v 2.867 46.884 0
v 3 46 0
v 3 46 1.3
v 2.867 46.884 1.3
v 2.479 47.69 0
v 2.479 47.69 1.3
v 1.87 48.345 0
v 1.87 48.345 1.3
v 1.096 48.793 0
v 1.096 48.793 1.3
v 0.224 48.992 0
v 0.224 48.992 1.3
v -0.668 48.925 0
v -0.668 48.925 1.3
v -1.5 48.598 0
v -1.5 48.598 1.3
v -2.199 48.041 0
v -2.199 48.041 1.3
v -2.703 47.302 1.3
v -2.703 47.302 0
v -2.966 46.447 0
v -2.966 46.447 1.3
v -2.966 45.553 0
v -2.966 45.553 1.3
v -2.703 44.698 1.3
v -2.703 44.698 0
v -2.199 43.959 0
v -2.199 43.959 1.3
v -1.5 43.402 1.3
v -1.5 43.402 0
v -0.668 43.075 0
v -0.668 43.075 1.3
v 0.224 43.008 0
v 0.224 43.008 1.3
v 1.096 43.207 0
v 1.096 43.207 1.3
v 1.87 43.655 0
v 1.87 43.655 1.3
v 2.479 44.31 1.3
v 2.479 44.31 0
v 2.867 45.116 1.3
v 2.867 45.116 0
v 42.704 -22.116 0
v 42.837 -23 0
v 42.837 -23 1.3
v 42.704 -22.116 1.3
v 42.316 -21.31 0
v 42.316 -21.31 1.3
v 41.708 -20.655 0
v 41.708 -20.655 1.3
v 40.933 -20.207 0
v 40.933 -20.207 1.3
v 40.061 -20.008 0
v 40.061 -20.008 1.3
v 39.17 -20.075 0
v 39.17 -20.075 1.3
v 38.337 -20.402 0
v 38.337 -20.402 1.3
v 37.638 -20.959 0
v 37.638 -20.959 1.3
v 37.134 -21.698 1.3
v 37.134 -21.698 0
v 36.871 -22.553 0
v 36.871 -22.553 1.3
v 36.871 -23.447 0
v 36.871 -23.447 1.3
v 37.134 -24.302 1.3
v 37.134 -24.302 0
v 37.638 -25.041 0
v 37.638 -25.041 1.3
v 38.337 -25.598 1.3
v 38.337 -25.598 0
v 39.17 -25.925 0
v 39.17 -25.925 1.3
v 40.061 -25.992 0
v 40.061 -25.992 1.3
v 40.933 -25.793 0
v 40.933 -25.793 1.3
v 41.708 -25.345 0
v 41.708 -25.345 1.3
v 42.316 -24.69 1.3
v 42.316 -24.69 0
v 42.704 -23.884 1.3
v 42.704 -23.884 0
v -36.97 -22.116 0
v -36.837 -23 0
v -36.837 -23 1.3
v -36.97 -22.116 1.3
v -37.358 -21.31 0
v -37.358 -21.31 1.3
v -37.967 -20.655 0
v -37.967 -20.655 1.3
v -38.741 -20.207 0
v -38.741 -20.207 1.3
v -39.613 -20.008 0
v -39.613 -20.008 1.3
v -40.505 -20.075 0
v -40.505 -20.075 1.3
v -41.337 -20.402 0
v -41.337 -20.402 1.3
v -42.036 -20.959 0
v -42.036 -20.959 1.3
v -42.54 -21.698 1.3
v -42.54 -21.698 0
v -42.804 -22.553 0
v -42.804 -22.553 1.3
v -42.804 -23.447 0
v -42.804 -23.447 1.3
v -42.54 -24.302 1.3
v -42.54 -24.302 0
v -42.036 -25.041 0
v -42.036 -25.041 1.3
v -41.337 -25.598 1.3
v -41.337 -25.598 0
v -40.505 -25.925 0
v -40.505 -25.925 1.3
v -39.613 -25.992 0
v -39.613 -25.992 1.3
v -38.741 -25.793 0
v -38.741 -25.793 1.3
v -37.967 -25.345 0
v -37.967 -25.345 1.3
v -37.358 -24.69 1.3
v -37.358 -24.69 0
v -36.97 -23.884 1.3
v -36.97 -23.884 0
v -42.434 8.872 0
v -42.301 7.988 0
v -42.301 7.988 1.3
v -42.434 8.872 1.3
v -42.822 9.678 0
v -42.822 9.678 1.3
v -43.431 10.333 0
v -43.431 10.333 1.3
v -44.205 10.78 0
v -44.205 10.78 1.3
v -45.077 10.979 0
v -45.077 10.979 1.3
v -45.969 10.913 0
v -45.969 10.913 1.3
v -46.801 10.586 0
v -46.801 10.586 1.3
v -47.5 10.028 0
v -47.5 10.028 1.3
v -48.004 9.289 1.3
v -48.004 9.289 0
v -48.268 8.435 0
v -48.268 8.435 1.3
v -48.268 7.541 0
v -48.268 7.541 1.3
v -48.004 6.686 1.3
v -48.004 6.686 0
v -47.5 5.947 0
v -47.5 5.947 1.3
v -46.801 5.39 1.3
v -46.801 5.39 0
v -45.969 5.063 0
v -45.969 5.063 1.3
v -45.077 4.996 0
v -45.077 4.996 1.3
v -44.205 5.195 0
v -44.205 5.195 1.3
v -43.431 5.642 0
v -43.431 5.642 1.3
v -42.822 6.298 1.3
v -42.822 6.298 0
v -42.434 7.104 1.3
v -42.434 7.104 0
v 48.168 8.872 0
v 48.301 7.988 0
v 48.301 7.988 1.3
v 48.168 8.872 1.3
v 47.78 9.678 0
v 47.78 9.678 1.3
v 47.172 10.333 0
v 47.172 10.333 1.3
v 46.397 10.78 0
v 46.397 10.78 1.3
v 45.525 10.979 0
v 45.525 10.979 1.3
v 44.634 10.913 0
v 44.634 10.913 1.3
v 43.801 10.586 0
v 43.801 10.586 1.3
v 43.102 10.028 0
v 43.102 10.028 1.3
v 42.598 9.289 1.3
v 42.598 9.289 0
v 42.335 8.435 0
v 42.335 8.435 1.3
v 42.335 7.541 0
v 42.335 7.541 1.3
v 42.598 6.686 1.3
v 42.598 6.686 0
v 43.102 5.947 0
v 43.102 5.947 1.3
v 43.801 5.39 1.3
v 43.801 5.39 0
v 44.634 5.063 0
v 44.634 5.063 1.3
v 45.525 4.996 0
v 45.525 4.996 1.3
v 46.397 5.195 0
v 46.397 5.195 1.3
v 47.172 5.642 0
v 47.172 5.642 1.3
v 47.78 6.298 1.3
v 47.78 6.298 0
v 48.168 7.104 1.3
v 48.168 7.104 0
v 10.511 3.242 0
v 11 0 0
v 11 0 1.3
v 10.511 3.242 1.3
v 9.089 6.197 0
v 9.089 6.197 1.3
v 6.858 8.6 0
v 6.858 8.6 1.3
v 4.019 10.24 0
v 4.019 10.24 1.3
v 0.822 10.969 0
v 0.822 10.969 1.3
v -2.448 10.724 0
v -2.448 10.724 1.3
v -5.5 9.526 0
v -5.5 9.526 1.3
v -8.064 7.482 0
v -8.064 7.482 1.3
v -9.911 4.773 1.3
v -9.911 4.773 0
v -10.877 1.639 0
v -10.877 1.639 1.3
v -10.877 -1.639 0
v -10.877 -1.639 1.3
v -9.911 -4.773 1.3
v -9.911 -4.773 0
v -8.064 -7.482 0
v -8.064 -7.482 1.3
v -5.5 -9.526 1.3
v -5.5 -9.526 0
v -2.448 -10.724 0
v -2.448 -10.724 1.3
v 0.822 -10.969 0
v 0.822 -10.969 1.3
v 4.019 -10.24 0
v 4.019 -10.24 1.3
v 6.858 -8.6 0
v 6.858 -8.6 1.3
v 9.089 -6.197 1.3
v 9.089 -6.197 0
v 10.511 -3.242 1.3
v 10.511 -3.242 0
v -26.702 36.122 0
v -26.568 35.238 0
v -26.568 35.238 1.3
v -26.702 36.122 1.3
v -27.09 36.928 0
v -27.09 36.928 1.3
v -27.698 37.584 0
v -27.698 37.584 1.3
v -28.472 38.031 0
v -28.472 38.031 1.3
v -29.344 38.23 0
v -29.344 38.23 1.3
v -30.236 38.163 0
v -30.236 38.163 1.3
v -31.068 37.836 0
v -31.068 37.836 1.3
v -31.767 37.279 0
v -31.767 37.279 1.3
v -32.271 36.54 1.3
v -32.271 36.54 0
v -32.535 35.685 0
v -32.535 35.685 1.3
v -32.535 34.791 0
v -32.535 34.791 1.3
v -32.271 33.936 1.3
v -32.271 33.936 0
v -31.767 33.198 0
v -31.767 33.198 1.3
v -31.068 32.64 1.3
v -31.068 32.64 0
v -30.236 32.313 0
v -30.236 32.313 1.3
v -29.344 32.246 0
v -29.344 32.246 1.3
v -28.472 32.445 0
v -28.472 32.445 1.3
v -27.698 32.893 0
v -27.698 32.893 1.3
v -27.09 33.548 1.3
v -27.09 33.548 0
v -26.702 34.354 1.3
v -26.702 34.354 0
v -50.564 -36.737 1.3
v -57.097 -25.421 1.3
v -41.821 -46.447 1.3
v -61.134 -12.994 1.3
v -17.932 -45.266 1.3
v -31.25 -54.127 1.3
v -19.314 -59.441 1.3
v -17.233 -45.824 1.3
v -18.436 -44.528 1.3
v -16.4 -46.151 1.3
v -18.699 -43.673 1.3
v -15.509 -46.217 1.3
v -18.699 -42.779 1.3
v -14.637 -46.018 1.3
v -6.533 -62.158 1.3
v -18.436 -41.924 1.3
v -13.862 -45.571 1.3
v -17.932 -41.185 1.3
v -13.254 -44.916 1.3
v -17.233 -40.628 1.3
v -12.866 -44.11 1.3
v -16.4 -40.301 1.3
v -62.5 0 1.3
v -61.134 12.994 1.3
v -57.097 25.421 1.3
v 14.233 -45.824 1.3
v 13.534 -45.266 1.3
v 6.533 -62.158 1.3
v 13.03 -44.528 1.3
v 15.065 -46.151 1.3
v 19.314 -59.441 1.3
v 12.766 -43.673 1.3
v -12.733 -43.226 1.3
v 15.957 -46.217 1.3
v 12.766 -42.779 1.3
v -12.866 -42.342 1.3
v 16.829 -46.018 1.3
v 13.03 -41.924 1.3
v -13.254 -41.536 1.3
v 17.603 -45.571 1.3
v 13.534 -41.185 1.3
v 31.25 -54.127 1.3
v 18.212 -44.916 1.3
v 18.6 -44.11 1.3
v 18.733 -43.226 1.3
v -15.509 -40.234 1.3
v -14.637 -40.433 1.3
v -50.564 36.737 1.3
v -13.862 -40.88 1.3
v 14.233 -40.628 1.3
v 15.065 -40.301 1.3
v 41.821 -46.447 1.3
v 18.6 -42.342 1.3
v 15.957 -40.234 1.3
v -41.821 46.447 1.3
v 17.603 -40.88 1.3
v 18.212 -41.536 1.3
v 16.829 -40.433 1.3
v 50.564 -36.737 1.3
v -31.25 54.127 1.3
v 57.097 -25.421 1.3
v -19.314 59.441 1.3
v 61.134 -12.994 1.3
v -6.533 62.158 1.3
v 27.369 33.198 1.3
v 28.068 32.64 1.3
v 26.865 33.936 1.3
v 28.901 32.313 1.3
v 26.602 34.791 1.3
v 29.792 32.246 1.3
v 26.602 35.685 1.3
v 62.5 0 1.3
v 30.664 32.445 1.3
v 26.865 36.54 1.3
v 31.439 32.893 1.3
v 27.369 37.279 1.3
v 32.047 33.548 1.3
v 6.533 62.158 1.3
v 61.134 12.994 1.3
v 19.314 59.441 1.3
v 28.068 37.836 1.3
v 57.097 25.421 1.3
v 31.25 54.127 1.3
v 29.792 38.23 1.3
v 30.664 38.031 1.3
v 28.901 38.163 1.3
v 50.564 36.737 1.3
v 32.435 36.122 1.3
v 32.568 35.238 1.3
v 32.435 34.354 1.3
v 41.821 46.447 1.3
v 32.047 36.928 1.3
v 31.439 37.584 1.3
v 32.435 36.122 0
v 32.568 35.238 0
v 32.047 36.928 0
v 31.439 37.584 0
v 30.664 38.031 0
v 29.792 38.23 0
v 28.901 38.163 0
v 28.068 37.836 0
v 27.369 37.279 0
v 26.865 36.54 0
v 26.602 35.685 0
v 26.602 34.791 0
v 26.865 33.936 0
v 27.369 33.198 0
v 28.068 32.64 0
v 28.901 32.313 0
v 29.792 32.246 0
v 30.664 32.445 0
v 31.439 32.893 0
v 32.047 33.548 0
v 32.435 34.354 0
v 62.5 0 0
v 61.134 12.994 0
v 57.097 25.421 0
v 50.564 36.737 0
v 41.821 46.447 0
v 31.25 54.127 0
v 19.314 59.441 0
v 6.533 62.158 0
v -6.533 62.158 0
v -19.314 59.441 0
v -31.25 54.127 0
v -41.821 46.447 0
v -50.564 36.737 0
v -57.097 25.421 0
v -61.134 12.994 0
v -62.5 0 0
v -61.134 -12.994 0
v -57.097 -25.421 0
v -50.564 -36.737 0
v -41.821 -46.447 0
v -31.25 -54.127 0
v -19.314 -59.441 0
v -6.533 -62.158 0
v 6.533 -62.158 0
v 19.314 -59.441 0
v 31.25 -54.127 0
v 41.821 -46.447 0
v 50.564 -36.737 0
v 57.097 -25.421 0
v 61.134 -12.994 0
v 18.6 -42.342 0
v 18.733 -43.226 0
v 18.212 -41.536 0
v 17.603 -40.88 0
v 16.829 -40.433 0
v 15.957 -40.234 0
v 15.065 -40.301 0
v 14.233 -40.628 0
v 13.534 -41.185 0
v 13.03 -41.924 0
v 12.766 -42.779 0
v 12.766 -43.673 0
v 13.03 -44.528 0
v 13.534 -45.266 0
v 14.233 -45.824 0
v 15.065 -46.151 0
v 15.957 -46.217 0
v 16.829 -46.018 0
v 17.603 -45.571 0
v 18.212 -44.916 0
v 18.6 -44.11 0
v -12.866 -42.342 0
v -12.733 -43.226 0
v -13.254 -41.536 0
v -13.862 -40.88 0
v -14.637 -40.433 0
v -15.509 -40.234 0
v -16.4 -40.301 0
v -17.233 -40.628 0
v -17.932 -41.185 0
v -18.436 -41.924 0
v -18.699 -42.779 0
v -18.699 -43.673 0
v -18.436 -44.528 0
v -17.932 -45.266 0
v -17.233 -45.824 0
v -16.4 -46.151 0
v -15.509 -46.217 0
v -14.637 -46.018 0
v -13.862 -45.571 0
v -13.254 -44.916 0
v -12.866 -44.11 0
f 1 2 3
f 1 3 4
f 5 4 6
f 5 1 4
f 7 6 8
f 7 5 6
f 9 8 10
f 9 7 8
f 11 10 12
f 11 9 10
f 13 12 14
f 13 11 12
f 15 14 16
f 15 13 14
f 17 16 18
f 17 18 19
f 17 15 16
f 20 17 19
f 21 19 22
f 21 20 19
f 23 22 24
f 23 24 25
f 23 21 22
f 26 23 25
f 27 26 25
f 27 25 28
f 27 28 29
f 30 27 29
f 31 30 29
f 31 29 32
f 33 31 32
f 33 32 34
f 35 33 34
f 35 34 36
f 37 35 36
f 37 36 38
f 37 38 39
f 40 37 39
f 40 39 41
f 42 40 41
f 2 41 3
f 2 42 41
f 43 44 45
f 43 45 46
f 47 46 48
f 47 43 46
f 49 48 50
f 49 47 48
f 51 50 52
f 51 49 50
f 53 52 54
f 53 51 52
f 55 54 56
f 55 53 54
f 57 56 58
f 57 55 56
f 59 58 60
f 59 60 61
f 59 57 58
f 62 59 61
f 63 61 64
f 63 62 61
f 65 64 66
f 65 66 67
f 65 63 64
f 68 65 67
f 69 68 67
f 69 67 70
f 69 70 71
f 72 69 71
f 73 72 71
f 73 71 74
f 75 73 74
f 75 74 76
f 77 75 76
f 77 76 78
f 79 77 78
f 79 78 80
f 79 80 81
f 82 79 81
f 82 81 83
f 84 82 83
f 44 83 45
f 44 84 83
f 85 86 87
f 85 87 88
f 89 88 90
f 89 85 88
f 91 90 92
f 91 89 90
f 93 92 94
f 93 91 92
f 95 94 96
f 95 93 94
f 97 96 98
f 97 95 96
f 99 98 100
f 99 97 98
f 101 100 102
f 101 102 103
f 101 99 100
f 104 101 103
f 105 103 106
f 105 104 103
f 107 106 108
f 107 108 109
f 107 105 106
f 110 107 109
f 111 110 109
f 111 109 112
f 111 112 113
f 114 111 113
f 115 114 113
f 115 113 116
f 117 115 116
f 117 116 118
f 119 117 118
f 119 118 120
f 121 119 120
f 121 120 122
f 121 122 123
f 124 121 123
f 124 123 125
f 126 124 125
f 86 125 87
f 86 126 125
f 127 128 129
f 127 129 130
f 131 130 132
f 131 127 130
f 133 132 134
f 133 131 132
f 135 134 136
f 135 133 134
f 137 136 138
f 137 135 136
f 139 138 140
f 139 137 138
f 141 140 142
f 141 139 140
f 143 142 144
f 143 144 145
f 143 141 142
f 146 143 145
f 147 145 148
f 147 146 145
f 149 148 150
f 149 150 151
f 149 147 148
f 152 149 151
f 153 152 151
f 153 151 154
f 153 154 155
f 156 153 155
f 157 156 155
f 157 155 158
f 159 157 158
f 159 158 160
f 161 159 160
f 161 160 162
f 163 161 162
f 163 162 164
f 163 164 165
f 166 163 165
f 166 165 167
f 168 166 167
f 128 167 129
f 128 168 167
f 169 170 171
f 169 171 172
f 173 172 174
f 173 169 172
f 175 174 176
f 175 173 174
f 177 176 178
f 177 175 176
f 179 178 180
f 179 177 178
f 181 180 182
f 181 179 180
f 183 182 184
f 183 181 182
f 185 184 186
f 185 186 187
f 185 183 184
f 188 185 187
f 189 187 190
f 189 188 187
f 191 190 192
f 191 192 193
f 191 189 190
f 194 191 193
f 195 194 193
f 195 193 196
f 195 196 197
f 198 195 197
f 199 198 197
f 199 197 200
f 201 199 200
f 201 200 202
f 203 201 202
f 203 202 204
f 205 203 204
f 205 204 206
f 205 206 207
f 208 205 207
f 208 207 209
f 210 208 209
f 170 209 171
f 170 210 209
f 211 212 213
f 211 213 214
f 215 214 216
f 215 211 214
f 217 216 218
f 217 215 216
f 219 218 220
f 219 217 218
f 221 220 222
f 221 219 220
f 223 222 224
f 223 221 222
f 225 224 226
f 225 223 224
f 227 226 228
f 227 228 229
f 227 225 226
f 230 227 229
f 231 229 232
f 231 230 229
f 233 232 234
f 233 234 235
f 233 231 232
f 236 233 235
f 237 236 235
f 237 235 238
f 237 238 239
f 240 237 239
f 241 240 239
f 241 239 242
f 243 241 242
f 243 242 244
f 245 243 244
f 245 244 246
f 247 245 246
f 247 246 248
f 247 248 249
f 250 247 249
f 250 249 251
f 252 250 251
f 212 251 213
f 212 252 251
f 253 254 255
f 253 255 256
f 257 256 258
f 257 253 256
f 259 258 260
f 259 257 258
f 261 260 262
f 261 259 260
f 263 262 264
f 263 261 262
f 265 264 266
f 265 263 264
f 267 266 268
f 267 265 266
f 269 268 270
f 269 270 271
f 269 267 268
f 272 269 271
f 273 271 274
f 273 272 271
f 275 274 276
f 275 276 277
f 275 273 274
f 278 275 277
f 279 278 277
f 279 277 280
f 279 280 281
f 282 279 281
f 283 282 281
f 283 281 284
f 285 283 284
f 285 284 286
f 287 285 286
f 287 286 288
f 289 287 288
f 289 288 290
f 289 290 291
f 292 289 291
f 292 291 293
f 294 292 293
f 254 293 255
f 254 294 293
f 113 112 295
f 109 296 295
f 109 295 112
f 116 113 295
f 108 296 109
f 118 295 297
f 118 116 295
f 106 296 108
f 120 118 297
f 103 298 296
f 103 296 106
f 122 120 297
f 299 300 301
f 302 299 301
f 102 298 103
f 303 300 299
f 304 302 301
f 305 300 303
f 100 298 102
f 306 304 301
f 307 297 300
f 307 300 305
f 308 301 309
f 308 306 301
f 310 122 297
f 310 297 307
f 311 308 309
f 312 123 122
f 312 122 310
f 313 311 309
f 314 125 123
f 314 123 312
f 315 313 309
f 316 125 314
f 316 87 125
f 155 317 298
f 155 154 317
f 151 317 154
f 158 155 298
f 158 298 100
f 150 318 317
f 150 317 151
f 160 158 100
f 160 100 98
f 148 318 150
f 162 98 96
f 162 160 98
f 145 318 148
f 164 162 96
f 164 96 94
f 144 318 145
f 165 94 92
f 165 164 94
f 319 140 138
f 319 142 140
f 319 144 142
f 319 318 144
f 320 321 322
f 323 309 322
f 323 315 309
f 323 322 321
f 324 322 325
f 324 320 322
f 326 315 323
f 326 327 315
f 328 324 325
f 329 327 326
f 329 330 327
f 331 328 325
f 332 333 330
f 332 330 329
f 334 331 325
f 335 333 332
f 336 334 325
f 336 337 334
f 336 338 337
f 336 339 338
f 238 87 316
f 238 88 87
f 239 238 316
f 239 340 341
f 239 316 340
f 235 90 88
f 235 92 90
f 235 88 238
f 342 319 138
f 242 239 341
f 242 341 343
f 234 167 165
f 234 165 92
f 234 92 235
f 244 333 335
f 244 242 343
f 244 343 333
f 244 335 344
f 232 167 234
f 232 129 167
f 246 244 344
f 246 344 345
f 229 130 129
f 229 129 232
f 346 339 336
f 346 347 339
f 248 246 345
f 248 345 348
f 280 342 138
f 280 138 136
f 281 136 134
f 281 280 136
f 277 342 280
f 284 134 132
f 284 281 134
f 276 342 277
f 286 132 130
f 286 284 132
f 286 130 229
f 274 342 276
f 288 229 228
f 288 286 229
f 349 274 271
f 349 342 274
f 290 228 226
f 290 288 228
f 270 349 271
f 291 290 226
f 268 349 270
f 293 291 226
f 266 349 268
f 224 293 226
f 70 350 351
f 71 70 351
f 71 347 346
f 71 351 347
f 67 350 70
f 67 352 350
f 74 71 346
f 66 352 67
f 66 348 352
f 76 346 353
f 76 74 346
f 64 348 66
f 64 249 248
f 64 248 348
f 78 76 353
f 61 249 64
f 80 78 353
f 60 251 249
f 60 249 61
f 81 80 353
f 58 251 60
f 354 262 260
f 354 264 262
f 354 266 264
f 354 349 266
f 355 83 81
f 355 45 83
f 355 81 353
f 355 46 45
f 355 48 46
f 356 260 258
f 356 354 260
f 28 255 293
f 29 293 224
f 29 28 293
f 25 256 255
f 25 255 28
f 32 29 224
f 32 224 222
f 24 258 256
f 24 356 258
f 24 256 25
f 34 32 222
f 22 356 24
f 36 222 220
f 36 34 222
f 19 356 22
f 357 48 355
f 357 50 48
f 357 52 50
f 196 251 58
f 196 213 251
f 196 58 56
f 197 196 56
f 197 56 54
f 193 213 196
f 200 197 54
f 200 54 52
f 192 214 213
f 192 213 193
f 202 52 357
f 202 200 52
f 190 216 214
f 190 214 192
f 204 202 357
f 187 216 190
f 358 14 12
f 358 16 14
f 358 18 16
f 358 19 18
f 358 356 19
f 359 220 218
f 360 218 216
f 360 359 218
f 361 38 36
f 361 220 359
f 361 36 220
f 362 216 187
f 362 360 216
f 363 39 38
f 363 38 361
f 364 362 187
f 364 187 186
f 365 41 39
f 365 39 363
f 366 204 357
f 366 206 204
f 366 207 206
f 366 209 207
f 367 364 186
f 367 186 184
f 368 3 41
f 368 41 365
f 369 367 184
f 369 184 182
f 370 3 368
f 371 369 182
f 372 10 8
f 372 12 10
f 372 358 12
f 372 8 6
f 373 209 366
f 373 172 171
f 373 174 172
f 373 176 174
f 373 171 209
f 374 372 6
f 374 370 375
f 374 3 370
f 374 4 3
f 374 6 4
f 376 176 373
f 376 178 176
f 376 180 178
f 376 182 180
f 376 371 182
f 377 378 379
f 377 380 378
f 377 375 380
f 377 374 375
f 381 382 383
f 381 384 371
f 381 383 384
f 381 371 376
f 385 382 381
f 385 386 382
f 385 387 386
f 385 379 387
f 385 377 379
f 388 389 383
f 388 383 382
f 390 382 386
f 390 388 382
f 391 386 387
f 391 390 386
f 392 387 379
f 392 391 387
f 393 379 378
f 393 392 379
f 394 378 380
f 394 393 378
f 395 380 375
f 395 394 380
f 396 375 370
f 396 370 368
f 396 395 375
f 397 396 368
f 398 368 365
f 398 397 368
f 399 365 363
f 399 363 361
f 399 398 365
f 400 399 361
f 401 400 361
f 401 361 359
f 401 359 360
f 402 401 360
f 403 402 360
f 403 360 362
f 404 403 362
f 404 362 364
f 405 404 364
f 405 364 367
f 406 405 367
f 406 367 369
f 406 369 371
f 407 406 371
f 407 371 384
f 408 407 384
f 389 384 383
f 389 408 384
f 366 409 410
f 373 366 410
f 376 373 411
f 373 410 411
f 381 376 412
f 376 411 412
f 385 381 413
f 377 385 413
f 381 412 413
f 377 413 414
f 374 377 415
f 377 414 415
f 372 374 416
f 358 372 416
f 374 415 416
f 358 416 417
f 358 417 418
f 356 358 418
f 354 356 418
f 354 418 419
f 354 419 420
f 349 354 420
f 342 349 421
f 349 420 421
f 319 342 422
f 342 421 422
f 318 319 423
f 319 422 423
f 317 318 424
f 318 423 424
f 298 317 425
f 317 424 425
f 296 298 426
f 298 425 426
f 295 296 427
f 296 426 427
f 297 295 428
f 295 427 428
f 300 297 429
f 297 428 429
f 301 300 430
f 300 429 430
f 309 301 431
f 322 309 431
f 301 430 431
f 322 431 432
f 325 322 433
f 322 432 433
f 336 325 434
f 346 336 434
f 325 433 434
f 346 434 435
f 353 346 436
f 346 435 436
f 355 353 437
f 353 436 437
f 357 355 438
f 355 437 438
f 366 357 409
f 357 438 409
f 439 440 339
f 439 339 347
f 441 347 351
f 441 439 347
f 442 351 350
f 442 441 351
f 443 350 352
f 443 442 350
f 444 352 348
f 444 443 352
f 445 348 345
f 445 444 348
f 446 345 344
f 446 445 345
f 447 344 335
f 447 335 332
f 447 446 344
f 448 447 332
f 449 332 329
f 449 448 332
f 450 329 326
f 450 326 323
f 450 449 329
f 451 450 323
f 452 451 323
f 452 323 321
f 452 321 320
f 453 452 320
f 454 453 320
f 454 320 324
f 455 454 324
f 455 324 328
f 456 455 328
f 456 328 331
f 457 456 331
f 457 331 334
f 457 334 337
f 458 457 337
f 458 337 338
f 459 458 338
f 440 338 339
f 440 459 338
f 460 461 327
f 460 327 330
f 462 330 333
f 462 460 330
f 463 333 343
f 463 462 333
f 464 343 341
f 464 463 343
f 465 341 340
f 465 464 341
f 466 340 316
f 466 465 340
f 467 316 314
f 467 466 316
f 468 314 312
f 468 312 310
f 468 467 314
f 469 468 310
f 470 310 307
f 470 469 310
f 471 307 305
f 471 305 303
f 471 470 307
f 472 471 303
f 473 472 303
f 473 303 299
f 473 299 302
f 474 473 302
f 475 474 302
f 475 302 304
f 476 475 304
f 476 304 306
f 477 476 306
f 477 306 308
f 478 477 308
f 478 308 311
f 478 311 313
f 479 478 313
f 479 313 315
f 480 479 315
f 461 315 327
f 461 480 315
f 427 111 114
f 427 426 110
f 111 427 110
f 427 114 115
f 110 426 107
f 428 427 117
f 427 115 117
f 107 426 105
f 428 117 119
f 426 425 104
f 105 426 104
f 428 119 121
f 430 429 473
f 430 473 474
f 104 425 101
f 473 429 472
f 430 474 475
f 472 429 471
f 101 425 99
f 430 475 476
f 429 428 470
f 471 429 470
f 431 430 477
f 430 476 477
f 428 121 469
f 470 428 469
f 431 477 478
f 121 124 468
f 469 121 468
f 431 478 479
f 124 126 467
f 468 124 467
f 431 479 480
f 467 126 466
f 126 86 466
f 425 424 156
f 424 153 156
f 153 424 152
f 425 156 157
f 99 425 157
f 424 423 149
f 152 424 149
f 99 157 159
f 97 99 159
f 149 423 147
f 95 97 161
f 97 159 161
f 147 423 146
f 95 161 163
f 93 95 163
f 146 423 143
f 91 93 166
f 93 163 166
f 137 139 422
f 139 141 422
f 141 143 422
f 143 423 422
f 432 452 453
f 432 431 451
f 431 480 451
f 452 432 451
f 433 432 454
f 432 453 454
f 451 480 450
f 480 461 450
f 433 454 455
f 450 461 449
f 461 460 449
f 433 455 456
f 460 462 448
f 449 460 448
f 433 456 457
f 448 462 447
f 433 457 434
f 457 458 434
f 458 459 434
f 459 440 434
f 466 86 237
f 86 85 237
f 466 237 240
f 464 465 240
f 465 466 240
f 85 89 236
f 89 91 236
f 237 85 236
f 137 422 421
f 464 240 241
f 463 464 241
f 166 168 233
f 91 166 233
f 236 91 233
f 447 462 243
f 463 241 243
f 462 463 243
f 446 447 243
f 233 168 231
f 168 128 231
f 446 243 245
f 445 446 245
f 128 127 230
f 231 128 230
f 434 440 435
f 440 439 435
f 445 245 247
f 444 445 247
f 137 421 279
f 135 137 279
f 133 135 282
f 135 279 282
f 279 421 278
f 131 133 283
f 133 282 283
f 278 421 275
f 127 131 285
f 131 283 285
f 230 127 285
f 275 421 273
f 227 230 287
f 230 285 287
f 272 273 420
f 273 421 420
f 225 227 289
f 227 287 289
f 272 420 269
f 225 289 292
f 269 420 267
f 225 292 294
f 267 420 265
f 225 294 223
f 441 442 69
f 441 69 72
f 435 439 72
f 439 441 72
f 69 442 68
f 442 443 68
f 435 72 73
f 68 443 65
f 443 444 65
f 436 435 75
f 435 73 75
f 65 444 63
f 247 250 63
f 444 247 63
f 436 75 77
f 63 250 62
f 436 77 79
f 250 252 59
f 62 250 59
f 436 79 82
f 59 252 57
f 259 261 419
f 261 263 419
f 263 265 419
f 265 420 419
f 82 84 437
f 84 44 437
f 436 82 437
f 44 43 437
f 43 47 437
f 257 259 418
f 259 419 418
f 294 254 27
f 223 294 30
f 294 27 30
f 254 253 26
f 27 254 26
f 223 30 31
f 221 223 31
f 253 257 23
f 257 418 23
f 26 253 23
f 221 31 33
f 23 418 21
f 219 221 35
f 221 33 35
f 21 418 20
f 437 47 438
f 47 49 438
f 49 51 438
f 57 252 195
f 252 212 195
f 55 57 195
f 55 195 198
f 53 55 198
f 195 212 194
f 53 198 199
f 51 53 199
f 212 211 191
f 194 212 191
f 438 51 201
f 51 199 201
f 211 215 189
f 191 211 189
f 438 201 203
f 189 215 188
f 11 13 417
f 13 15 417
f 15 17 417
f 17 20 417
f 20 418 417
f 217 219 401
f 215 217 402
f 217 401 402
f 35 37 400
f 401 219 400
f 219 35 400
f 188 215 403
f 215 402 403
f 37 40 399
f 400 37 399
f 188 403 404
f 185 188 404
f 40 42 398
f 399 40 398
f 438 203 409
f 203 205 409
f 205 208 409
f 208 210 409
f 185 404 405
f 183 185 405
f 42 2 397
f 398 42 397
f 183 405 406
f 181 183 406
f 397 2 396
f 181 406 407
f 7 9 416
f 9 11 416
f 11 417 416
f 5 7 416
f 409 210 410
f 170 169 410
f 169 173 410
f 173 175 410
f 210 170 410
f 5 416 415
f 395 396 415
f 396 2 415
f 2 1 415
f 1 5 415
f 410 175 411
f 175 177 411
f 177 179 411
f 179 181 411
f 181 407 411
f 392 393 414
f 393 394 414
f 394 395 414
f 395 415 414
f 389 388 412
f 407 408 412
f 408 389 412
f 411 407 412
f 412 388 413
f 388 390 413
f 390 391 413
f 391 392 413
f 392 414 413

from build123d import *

# Parameters (mm, degrees)
SKETCH_R   = 62.5
SKETCH_R_2 = 11
SKETCH_R_3 = 3
PAD_DEPTH  = 1.3


with BuildPart() as part:
    # Sketch → Pad (new body)
    with BuildSketch(Plane.XY):
        Circle(SKETCH_R)
        Circle(SKETCH_R_2, mode=Mode.SUBTRACT)
        with Locations((0, 46)):
            Circle(SKETCH_R_3, mode=Mode.SUBTRACT)
        with Locations((29.56823, 35.238044)):
            Circle(SKETCH_R_3, mode=Mode.SUBTRACT)
        with Locations((45.301157, 7.987816)):
            Circle(SKETCH_R_3, mode=Mode.SUBTRACT)
        with Locations((39.837169, -23)):
            Circle(SKETCH_R_3, mode=Mode.SUBTRACT)
        with Locations((15.732927, -43.225861)):
            Circle(SKETCH_R_3, mode=Mode.SUBTRACT)
        with Locations((-15.732927, -43.225861)):
            Circle(SKETCH_R_3, mode=Mode.SUBTRACT)
        with Locations((-39.837169, -23)):
            Circle(SKETCH_R_3, mode=Mode.SUBTRACT)
        with Locations((-45.301157, 7.987816)):
            Circle(SKETCH_R_3, mode=Mode.SUBTRACT)
        with Locations((-29.56823, 35.238044)):
            Circle(SKETCH_R_3, mode=Mode.SUBTRACT)
    extrude(amount=PAD_DEPTH)


solid = part.part
